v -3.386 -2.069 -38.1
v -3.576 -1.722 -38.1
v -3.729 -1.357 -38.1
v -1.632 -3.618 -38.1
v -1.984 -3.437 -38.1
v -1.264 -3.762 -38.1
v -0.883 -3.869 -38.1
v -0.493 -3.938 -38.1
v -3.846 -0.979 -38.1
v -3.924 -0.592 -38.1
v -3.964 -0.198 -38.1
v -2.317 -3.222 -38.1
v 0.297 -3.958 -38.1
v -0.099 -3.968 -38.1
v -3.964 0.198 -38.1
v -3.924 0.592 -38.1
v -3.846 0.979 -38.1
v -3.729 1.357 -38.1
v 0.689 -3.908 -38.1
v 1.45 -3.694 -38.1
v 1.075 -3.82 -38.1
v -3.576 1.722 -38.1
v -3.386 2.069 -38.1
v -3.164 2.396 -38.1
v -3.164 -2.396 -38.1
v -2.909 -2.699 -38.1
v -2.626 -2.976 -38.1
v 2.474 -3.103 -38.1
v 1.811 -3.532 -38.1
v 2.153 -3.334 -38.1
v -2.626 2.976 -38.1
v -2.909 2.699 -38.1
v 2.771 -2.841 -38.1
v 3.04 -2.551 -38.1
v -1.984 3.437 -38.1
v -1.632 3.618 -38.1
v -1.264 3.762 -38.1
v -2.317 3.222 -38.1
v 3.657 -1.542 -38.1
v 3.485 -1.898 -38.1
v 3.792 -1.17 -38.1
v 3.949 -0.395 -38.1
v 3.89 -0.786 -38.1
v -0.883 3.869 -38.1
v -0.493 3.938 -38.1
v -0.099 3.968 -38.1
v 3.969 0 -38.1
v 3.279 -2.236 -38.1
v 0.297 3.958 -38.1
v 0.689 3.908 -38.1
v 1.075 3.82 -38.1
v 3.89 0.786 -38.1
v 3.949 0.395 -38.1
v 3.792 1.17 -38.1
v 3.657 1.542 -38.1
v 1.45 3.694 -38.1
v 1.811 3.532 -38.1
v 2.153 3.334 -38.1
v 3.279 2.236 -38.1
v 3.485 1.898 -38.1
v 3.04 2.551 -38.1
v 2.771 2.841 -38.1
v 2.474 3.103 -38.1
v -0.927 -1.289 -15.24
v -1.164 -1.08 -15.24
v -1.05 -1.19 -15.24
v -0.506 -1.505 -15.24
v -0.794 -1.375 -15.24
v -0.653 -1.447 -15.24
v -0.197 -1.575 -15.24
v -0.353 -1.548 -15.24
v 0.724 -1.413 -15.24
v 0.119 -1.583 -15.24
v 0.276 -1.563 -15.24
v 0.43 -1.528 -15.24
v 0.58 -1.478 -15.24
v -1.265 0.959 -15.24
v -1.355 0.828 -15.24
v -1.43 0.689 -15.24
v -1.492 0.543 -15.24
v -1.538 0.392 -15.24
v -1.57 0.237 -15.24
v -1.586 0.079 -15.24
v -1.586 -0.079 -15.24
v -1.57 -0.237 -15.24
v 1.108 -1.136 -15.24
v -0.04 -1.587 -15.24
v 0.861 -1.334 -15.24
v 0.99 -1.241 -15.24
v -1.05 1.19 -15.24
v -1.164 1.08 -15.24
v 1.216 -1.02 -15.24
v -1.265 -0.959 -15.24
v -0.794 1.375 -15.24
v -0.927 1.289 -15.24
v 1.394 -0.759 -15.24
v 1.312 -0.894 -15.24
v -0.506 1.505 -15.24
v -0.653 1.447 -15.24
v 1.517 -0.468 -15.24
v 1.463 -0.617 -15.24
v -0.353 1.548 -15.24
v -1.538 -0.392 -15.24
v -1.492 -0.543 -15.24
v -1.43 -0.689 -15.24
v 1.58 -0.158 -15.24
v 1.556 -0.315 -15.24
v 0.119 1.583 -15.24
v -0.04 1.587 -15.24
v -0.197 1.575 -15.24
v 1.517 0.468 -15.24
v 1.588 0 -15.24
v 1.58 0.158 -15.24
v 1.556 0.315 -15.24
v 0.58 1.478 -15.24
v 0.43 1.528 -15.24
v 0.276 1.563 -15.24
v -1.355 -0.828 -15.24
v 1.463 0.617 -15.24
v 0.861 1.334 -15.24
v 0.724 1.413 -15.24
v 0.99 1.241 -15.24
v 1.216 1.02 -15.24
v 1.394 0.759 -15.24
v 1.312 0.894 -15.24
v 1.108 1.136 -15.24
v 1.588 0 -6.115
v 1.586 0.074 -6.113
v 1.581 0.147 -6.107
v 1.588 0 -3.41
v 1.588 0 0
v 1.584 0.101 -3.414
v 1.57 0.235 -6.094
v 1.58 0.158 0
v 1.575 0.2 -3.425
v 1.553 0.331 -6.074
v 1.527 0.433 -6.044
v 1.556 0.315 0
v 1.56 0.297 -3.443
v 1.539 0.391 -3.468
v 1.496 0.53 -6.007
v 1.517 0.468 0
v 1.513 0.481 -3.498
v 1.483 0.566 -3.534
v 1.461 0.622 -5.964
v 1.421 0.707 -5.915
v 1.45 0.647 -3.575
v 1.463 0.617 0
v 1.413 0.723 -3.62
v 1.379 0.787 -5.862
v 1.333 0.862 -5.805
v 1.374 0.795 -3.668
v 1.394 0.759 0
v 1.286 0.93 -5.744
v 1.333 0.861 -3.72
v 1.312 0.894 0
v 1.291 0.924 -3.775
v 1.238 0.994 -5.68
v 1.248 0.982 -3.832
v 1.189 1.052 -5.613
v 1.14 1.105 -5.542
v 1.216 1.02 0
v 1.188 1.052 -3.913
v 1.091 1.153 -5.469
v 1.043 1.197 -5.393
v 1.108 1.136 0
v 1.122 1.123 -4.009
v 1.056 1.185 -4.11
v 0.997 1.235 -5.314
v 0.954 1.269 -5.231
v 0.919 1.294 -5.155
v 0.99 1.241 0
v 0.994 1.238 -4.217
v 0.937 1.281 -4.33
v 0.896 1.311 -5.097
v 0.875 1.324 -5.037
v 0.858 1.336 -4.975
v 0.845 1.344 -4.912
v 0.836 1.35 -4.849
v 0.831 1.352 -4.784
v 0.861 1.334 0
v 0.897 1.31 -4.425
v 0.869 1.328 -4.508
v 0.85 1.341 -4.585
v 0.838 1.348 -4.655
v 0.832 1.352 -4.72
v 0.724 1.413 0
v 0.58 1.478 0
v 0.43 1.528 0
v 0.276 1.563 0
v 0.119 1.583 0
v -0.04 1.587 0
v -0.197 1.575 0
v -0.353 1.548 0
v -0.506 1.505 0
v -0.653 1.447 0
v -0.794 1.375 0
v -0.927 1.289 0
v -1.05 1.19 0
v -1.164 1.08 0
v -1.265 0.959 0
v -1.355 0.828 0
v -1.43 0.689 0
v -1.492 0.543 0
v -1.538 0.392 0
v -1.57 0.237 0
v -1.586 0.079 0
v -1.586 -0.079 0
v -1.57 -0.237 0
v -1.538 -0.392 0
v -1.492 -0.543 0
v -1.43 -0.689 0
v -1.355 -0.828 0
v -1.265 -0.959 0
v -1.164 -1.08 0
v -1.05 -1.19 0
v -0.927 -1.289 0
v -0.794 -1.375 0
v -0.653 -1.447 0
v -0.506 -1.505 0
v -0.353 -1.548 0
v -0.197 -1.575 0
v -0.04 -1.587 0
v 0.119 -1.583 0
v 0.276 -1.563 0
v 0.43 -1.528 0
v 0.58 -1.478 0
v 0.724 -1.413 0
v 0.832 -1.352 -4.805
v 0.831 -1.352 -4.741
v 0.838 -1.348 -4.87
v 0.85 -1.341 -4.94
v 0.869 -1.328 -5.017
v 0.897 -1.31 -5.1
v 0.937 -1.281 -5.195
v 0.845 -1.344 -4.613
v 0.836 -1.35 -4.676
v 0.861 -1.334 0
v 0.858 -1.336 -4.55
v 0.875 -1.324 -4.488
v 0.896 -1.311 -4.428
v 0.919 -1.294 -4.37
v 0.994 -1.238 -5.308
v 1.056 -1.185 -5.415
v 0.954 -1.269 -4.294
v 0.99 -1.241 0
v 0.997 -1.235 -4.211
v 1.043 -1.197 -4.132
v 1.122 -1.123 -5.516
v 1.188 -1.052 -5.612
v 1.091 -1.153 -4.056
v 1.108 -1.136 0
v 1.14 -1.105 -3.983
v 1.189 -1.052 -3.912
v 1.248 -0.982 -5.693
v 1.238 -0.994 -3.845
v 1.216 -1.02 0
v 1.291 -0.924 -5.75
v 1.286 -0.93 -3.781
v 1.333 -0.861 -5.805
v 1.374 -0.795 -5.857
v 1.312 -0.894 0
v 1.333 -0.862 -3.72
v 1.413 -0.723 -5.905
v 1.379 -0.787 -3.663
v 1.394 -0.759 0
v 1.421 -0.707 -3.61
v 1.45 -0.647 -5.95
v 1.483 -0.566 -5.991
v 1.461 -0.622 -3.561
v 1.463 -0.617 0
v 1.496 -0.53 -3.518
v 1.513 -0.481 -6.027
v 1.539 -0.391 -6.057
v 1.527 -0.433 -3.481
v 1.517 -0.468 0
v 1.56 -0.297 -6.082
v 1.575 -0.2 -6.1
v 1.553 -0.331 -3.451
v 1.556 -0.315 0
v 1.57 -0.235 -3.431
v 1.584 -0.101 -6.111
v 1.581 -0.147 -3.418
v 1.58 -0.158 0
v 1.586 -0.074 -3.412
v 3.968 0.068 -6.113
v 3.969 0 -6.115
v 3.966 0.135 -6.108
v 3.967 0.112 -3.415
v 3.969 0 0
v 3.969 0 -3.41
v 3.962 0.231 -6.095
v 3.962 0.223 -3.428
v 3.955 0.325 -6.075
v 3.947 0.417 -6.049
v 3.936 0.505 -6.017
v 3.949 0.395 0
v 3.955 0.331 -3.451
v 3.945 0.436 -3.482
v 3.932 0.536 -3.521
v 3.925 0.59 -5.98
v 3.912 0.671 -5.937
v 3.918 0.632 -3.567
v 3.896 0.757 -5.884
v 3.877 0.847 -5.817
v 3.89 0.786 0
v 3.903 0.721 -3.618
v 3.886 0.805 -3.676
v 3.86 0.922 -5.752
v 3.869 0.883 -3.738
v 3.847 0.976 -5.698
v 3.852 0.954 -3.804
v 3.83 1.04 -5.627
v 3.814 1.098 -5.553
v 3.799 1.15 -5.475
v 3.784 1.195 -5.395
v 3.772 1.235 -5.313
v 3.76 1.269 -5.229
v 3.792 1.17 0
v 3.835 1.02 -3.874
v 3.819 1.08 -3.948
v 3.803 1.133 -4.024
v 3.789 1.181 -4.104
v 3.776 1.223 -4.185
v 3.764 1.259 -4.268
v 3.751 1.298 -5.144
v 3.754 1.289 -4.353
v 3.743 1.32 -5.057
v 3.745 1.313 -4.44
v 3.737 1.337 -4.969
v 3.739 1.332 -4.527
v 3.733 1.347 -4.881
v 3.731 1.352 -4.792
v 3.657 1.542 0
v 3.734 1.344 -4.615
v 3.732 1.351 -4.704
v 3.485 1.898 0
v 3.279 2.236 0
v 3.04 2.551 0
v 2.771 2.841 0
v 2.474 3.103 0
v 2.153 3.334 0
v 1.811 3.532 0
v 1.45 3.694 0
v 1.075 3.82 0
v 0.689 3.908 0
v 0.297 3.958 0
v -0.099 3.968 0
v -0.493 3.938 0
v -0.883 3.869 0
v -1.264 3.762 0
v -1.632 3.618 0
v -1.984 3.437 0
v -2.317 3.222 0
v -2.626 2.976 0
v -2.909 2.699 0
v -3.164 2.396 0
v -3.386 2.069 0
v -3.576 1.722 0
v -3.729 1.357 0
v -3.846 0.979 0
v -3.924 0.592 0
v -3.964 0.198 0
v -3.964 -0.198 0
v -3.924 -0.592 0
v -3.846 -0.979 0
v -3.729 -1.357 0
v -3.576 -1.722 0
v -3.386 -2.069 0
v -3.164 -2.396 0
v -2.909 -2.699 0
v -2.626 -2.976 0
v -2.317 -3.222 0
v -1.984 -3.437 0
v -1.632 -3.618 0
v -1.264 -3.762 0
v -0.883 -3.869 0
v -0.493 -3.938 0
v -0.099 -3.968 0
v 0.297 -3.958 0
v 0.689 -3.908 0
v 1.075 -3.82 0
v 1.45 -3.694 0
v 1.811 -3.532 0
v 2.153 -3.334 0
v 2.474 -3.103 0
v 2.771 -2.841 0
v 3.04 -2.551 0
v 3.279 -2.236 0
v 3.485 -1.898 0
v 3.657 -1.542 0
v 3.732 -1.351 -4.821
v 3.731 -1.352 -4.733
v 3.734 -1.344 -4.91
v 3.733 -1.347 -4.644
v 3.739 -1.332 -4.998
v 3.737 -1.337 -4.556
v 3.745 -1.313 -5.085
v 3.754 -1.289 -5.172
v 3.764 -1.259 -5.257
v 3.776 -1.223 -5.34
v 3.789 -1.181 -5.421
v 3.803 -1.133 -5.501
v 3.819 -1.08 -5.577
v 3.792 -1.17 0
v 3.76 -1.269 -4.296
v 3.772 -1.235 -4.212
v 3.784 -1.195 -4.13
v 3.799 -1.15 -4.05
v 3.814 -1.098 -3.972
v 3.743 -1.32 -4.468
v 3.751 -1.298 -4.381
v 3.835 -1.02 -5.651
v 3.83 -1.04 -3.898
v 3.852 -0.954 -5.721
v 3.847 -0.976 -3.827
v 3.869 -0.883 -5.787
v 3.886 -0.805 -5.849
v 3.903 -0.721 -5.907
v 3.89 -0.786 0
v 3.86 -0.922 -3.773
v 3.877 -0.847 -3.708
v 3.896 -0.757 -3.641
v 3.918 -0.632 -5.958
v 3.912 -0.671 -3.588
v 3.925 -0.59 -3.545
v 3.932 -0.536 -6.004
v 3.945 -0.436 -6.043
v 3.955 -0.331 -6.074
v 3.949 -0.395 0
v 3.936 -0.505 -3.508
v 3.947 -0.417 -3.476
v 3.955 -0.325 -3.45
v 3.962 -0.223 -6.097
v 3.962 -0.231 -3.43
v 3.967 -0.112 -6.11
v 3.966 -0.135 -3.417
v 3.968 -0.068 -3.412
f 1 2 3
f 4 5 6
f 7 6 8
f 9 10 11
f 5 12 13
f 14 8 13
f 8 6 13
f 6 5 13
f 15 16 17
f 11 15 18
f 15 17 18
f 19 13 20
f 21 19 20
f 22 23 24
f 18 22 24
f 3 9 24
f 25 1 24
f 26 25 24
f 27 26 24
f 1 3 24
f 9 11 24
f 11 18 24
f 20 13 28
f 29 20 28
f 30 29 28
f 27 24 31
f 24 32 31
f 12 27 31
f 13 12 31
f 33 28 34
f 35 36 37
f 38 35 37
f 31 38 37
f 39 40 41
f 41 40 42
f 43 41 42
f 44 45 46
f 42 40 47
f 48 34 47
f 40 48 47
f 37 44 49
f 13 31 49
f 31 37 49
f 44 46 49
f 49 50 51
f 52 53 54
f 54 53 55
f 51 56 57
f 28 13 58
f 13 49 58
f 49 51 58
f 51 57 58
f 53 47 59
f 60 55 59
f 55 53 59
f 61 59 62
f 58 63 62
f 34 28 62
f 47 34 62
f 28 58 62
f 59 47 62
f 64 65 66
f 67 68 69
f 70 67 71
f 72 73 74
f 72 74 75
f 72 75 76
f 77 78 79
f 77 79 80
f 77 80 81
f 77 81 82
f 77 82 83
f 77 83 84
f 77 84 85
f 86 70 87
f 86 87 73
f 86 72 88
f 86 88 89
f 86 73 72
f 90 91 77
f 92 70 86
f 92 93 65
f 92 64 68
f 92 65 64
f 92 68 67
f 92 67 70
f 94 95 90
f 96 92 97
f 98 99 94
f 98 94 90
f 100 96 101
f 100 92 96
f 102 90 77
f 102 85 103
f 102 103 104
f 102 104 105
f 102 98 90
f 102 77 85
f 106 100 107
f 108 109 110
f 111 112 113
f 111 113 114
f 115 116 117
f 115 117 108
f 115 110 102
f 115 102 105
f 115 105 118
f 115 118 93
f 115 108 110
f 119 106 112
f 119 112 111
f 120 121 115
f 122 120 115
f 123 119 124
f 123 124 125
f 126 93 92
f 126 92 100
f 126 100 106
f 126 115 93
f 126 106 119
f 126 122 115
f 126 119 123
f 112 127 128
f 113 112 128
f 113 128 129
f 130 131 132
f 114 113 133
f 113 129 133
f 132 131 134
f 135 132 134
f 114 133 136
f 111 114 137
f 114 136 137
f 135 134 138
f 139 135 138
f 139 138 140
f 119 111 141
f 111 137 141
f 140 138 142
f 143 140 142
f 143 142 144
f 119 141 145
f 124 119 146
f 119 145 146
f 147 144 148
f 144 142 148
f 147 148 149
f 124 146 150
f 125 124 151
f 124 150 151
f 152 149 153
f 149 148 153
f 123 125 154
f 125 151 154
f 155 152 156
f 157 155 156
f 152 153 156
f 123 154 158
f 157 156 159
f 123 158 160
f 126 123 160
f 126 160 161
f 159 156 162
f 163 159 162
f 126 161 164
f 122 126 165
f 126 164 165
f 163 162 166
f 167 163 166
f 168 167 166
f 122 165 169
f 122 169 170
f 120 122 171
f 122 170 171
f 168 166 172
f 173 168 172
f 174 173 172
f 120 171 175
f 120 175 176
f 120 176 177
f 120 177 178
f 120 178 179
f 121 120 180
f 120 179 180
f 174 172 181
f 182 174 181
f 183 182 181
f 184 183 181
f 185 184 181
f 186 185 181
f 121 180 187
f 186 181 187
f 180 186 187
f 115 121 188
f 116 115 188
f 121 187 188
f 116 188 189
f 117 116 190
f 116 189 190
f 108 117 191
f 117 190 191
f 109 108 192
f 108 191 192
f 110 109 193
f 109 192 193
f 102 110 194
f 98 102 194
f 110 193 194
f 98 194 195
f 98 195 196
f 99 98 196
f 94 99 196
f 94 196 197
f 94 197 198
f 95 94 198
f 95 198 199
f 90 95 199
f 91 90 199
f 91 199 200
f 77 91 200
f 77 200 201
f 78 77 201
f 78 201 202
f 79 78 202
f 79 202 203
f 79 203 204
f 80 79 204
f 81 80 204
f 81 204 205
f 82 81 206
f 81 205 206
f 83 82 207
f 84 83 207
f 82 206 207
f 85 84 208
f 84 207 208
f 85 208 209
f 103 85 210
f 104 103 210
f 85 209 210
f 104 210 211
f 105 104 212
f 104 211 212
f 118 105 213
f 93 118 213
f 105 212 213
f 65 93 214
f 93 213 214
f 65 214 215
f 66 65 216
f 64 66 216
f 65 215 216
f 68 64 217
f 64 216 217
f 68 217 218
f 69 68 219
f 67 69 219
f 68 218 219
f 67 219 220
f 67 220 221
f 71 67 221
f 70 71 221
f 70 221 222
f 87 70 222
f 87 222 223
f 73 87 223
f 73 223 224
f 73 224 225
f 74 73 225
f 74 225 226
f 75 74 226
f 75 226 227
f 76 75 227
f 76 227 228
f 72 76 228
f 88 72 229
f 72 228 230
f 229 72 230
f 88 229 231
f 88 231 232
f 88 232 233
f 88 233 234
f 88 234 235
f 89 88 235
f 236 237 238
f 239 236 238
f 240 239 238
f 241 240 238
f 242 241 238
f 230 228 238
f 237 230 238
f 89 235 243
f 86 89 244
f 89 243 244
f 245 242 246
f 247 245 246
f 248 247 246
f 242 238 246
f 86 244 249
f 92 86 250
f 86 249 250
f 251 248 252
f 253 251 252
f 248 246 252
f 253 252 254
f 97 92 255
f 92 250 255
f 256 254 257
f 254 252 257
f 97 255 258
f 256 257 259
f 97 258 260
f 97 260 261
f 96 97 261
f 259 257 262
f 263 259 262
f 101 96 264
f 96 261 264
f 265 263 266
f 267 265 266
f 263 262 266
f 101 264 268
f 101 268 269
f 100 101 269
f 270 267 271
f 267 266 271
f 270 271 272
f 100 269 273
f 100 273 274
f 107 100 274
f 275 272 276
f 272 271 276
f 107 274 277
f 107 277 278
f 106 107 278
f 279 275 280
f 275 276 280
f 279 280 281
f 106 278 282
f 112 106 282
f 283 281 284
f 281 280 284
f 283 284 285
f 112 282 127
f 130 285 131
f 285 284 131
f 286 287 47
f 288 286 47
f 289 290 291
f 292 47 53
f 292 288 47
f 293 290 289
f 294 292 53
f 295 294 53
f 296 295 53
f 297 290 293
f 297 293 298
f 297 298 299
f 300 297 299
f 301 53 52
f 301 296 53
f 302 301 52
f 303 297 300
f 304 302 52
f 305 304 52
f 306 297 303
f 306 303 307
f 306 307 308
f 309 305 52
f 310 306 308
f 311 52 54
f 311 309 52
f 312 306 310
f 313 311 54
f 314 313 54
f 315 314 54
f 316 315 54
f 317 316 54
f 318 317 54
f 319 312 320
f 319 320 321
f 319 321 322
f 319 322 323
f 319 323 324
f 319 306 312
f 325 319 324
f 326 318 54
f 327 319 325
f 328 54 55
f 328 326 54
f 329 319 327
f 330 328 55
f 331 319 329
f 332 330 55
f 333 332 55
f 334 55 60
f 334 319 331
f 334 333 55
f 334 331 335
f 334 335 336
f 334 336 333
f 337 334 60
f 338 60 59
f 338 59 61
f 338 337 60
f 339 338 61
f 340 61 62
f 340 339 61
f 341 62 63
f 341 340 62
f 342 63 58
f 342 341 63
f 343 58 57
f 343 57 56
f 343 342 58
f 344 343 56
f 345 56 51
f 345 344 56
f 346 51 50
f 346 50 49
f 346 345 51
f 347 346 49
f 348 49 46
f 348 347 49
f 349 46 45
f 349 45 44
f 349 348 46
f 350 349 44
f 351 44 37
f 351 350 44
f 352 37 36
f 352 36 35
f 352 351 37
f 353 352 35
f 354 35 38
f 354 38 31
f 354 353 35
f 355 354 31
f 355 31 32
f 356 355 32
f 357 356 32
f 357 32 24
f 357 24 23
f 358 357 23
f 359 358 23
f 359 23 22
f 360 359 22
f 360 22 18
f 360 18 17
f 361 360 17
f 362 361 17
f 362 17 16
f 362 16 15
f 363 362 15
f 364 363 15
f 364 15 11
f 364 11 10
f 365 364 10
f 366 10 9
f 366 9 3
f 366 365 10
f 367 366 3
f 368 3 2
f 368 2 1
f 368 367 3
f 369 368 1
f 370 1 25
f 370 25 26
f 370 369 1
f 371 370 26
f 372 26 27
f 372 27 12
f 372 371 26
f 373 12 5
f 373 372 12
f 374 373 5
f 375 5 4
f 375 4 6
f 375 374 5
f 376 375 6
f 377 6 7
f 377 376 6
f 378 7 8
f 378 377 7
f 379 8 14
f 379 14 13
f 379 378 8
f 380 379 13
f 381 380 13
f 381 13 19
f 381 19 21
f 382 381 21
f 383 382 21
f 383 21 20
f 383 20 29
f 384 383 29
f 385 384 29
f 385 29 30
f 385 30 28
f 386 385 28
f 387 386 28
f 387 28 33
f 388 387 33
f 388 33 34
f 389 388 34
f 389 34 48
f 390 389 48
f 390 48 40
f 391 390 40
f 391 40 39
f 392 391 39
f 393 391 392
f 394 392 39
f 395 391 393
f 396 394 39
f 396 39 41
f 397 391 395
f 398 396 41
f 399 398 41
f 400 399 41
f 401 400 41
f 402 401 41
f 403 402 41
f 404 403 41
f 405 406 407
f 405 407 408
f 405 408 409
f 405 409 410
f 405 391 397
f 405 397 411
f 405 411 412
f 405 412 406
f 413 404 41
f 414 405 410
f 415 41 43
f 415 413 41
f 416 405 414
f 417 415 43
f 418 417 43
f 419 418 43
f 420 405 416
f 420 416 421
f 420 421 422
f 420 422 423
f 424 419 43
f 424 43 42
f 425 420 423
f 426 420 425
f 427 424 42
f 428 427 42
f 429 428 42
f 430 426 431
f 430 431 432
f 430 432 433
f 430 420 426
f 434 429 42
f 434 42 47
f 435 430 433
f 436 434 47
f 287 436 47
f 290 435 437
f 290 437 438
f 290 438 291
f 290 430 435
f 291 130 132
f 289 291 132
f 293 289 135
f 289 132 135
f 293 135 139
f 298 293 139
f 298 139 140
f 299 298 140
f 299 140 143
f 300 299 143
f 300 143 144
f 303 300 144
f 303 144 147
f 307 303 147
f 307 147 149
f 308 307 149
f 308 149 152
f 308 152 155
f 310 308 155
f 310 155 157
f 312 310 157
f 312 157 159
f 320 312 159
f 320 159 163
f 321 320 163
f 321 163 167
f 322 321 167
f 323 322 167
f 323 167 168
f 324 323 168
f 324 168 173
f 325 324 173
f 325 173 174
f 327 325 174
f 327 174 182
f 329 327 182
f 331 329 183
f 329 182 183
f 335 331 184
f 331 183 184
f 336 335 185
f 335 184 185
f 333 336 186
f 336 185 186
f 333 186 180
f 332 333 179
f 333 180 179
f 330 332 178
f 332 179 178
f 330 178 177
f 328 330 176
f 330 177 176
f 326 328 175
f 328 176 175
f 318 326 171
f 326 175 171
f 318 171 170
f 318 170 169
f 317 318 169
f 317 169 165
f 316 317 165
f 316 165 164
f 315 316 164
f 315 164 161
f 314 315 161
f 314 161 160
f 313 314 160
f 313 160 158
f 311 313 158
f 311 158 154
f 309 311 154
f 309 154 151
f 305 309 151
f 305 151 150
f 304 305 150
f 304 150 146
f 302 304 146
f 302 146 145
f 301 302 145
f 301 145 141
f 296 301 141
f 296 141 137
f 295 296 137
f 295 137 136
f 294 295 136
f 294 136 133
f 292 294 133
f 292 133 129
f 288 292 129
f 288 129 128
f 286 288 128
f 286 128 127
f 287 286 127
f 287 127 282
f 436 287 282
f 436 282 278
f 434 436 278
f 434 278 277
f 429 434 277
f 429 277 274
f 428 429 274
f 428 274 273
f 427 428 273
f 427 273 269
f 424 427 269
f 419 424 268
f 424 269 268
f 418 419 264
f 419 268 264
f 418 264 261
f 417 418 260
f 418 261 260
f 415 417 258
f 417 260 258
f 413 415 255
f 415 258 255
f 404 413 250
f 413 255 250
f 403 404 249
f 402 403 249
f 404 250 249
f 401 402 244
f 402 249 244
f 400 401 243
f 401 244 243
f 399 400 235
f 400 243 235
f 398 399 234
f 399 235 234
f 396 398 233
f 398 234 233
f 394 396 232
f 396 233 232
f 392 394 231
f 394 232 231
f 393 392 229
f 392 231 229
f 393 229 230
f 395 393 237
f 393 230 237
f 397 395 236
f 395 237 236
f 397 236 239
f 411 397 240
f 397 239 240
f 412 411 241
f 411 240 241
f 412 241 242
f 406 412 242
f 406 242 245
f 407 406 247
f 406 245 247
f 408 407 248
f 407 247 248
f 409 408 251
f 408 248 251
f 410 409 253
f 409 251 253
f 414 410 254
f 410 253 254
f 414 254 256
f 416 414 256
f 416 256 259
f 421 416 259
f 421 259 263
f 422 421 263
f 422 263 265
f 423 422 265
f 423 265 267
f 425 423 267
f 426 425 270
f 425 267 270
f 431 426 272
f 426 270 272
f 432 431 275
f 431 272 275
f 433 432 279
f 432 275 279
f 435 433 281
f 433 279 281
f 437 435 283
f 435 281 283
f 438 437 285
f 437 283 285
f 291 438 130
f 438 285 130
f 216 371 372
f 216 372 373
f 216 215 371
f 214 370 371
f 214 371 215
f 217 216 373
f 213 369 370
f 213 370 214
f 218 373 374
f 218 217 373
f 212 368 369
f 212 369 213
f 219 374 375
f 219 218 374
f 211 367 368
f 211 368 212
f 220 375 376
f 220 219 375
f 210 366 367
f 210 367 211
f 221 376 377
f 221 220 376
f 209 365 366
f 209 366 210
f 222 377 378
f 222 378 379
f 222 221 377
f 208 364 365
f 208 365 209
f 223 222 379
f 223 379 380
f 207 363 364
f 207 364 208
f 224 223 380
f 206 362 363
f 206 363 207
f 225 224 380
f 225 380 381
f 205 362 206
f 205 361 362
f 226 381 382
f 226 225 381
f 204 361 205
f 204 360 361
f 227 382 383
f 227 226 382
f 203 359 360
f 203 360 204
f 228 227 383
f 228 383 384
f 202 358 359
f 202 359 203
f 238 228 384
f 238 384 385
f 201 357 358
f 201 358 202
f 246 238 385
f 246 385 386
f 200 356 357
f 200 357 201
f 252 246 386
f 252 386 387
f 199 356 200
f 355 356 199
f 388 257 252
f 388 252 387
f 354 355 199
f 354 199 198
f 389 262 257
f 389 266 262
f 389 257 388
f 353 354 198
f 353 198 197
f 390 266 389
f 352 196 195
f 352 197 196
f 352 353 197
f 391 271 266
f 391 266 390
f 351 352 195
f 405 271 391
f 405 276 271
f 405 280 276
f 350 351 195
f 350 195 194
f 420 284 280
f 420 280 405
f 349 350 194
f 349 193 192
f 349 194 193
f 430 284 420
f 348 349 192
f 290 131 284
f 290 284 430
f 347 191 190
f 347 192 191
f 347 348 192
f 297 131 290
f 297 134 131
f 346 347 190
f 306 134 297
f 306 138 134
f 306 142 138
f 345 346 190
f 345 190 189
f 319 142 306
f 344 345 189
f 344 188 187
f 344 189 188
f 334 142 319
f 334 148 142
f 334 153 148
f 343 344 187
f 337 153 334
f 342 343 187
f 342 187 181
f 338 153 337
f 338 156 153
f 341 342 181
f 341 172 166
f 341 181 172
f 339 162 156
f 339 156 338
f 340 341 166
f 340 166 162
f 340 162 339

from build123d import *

# Parameters (mm, degrees)
SKETCH1_R                 = 3.96875
BODY_DEPTH                = 38.1
SKETCH1_3_R               = 1.5875
POT_SHAFT_OPENING_DEPTH   = 15.24
F_6_32_TAPPED_HOLE1_D     = 2.7051
F_6_32_TAPPED_HOLE1_DEPTH = 3.81
F_6_32_TAPPED_HOLE1_TIP   = 0.81269403


with BuildPart() as part:
    # Sketch1 → Body (new body)
    with BuildSketch(Plane.XY):
        Circle(SKETCH1_R)
    extrude(amount=-BODY_DEPTH)

    # Sketch1<3> → POT Shaft Opening (cut)
    with BuildSketch(Plane.XY):
        Circle(SKETCH1_3_R)
    extrude(amount=-POT_SHAFT_OPENING_DEPTH, mode=Mode.SUBTRACT)

    # #6-32 Tapped Hole1
    with Locations(Plane(origin=(3.96875, 0, 0), x_dir=(0, 0, -1), z_dir=(1, 0, 0))):
        with Locations((4.7625, 0)):
            Hole(F_6_32_TAPPED_HOLE1_D / 2, depth=F_6_32_TAPPED_HOLE1_DEPTH)
            with Locations((0, 0, -(F_6_32_TAPPED_HOLE1_DEPTH + F_6_32_TAPPED_HOLE1_TIP / 2))):  # 118° drill point
                Cone(0, F_6_32_TAPPED_HOLE1_D / 2, F_6_32_TAPPED_HOLE1_TIP, mode=Mode.SUBTRACT)


solid = part.part
